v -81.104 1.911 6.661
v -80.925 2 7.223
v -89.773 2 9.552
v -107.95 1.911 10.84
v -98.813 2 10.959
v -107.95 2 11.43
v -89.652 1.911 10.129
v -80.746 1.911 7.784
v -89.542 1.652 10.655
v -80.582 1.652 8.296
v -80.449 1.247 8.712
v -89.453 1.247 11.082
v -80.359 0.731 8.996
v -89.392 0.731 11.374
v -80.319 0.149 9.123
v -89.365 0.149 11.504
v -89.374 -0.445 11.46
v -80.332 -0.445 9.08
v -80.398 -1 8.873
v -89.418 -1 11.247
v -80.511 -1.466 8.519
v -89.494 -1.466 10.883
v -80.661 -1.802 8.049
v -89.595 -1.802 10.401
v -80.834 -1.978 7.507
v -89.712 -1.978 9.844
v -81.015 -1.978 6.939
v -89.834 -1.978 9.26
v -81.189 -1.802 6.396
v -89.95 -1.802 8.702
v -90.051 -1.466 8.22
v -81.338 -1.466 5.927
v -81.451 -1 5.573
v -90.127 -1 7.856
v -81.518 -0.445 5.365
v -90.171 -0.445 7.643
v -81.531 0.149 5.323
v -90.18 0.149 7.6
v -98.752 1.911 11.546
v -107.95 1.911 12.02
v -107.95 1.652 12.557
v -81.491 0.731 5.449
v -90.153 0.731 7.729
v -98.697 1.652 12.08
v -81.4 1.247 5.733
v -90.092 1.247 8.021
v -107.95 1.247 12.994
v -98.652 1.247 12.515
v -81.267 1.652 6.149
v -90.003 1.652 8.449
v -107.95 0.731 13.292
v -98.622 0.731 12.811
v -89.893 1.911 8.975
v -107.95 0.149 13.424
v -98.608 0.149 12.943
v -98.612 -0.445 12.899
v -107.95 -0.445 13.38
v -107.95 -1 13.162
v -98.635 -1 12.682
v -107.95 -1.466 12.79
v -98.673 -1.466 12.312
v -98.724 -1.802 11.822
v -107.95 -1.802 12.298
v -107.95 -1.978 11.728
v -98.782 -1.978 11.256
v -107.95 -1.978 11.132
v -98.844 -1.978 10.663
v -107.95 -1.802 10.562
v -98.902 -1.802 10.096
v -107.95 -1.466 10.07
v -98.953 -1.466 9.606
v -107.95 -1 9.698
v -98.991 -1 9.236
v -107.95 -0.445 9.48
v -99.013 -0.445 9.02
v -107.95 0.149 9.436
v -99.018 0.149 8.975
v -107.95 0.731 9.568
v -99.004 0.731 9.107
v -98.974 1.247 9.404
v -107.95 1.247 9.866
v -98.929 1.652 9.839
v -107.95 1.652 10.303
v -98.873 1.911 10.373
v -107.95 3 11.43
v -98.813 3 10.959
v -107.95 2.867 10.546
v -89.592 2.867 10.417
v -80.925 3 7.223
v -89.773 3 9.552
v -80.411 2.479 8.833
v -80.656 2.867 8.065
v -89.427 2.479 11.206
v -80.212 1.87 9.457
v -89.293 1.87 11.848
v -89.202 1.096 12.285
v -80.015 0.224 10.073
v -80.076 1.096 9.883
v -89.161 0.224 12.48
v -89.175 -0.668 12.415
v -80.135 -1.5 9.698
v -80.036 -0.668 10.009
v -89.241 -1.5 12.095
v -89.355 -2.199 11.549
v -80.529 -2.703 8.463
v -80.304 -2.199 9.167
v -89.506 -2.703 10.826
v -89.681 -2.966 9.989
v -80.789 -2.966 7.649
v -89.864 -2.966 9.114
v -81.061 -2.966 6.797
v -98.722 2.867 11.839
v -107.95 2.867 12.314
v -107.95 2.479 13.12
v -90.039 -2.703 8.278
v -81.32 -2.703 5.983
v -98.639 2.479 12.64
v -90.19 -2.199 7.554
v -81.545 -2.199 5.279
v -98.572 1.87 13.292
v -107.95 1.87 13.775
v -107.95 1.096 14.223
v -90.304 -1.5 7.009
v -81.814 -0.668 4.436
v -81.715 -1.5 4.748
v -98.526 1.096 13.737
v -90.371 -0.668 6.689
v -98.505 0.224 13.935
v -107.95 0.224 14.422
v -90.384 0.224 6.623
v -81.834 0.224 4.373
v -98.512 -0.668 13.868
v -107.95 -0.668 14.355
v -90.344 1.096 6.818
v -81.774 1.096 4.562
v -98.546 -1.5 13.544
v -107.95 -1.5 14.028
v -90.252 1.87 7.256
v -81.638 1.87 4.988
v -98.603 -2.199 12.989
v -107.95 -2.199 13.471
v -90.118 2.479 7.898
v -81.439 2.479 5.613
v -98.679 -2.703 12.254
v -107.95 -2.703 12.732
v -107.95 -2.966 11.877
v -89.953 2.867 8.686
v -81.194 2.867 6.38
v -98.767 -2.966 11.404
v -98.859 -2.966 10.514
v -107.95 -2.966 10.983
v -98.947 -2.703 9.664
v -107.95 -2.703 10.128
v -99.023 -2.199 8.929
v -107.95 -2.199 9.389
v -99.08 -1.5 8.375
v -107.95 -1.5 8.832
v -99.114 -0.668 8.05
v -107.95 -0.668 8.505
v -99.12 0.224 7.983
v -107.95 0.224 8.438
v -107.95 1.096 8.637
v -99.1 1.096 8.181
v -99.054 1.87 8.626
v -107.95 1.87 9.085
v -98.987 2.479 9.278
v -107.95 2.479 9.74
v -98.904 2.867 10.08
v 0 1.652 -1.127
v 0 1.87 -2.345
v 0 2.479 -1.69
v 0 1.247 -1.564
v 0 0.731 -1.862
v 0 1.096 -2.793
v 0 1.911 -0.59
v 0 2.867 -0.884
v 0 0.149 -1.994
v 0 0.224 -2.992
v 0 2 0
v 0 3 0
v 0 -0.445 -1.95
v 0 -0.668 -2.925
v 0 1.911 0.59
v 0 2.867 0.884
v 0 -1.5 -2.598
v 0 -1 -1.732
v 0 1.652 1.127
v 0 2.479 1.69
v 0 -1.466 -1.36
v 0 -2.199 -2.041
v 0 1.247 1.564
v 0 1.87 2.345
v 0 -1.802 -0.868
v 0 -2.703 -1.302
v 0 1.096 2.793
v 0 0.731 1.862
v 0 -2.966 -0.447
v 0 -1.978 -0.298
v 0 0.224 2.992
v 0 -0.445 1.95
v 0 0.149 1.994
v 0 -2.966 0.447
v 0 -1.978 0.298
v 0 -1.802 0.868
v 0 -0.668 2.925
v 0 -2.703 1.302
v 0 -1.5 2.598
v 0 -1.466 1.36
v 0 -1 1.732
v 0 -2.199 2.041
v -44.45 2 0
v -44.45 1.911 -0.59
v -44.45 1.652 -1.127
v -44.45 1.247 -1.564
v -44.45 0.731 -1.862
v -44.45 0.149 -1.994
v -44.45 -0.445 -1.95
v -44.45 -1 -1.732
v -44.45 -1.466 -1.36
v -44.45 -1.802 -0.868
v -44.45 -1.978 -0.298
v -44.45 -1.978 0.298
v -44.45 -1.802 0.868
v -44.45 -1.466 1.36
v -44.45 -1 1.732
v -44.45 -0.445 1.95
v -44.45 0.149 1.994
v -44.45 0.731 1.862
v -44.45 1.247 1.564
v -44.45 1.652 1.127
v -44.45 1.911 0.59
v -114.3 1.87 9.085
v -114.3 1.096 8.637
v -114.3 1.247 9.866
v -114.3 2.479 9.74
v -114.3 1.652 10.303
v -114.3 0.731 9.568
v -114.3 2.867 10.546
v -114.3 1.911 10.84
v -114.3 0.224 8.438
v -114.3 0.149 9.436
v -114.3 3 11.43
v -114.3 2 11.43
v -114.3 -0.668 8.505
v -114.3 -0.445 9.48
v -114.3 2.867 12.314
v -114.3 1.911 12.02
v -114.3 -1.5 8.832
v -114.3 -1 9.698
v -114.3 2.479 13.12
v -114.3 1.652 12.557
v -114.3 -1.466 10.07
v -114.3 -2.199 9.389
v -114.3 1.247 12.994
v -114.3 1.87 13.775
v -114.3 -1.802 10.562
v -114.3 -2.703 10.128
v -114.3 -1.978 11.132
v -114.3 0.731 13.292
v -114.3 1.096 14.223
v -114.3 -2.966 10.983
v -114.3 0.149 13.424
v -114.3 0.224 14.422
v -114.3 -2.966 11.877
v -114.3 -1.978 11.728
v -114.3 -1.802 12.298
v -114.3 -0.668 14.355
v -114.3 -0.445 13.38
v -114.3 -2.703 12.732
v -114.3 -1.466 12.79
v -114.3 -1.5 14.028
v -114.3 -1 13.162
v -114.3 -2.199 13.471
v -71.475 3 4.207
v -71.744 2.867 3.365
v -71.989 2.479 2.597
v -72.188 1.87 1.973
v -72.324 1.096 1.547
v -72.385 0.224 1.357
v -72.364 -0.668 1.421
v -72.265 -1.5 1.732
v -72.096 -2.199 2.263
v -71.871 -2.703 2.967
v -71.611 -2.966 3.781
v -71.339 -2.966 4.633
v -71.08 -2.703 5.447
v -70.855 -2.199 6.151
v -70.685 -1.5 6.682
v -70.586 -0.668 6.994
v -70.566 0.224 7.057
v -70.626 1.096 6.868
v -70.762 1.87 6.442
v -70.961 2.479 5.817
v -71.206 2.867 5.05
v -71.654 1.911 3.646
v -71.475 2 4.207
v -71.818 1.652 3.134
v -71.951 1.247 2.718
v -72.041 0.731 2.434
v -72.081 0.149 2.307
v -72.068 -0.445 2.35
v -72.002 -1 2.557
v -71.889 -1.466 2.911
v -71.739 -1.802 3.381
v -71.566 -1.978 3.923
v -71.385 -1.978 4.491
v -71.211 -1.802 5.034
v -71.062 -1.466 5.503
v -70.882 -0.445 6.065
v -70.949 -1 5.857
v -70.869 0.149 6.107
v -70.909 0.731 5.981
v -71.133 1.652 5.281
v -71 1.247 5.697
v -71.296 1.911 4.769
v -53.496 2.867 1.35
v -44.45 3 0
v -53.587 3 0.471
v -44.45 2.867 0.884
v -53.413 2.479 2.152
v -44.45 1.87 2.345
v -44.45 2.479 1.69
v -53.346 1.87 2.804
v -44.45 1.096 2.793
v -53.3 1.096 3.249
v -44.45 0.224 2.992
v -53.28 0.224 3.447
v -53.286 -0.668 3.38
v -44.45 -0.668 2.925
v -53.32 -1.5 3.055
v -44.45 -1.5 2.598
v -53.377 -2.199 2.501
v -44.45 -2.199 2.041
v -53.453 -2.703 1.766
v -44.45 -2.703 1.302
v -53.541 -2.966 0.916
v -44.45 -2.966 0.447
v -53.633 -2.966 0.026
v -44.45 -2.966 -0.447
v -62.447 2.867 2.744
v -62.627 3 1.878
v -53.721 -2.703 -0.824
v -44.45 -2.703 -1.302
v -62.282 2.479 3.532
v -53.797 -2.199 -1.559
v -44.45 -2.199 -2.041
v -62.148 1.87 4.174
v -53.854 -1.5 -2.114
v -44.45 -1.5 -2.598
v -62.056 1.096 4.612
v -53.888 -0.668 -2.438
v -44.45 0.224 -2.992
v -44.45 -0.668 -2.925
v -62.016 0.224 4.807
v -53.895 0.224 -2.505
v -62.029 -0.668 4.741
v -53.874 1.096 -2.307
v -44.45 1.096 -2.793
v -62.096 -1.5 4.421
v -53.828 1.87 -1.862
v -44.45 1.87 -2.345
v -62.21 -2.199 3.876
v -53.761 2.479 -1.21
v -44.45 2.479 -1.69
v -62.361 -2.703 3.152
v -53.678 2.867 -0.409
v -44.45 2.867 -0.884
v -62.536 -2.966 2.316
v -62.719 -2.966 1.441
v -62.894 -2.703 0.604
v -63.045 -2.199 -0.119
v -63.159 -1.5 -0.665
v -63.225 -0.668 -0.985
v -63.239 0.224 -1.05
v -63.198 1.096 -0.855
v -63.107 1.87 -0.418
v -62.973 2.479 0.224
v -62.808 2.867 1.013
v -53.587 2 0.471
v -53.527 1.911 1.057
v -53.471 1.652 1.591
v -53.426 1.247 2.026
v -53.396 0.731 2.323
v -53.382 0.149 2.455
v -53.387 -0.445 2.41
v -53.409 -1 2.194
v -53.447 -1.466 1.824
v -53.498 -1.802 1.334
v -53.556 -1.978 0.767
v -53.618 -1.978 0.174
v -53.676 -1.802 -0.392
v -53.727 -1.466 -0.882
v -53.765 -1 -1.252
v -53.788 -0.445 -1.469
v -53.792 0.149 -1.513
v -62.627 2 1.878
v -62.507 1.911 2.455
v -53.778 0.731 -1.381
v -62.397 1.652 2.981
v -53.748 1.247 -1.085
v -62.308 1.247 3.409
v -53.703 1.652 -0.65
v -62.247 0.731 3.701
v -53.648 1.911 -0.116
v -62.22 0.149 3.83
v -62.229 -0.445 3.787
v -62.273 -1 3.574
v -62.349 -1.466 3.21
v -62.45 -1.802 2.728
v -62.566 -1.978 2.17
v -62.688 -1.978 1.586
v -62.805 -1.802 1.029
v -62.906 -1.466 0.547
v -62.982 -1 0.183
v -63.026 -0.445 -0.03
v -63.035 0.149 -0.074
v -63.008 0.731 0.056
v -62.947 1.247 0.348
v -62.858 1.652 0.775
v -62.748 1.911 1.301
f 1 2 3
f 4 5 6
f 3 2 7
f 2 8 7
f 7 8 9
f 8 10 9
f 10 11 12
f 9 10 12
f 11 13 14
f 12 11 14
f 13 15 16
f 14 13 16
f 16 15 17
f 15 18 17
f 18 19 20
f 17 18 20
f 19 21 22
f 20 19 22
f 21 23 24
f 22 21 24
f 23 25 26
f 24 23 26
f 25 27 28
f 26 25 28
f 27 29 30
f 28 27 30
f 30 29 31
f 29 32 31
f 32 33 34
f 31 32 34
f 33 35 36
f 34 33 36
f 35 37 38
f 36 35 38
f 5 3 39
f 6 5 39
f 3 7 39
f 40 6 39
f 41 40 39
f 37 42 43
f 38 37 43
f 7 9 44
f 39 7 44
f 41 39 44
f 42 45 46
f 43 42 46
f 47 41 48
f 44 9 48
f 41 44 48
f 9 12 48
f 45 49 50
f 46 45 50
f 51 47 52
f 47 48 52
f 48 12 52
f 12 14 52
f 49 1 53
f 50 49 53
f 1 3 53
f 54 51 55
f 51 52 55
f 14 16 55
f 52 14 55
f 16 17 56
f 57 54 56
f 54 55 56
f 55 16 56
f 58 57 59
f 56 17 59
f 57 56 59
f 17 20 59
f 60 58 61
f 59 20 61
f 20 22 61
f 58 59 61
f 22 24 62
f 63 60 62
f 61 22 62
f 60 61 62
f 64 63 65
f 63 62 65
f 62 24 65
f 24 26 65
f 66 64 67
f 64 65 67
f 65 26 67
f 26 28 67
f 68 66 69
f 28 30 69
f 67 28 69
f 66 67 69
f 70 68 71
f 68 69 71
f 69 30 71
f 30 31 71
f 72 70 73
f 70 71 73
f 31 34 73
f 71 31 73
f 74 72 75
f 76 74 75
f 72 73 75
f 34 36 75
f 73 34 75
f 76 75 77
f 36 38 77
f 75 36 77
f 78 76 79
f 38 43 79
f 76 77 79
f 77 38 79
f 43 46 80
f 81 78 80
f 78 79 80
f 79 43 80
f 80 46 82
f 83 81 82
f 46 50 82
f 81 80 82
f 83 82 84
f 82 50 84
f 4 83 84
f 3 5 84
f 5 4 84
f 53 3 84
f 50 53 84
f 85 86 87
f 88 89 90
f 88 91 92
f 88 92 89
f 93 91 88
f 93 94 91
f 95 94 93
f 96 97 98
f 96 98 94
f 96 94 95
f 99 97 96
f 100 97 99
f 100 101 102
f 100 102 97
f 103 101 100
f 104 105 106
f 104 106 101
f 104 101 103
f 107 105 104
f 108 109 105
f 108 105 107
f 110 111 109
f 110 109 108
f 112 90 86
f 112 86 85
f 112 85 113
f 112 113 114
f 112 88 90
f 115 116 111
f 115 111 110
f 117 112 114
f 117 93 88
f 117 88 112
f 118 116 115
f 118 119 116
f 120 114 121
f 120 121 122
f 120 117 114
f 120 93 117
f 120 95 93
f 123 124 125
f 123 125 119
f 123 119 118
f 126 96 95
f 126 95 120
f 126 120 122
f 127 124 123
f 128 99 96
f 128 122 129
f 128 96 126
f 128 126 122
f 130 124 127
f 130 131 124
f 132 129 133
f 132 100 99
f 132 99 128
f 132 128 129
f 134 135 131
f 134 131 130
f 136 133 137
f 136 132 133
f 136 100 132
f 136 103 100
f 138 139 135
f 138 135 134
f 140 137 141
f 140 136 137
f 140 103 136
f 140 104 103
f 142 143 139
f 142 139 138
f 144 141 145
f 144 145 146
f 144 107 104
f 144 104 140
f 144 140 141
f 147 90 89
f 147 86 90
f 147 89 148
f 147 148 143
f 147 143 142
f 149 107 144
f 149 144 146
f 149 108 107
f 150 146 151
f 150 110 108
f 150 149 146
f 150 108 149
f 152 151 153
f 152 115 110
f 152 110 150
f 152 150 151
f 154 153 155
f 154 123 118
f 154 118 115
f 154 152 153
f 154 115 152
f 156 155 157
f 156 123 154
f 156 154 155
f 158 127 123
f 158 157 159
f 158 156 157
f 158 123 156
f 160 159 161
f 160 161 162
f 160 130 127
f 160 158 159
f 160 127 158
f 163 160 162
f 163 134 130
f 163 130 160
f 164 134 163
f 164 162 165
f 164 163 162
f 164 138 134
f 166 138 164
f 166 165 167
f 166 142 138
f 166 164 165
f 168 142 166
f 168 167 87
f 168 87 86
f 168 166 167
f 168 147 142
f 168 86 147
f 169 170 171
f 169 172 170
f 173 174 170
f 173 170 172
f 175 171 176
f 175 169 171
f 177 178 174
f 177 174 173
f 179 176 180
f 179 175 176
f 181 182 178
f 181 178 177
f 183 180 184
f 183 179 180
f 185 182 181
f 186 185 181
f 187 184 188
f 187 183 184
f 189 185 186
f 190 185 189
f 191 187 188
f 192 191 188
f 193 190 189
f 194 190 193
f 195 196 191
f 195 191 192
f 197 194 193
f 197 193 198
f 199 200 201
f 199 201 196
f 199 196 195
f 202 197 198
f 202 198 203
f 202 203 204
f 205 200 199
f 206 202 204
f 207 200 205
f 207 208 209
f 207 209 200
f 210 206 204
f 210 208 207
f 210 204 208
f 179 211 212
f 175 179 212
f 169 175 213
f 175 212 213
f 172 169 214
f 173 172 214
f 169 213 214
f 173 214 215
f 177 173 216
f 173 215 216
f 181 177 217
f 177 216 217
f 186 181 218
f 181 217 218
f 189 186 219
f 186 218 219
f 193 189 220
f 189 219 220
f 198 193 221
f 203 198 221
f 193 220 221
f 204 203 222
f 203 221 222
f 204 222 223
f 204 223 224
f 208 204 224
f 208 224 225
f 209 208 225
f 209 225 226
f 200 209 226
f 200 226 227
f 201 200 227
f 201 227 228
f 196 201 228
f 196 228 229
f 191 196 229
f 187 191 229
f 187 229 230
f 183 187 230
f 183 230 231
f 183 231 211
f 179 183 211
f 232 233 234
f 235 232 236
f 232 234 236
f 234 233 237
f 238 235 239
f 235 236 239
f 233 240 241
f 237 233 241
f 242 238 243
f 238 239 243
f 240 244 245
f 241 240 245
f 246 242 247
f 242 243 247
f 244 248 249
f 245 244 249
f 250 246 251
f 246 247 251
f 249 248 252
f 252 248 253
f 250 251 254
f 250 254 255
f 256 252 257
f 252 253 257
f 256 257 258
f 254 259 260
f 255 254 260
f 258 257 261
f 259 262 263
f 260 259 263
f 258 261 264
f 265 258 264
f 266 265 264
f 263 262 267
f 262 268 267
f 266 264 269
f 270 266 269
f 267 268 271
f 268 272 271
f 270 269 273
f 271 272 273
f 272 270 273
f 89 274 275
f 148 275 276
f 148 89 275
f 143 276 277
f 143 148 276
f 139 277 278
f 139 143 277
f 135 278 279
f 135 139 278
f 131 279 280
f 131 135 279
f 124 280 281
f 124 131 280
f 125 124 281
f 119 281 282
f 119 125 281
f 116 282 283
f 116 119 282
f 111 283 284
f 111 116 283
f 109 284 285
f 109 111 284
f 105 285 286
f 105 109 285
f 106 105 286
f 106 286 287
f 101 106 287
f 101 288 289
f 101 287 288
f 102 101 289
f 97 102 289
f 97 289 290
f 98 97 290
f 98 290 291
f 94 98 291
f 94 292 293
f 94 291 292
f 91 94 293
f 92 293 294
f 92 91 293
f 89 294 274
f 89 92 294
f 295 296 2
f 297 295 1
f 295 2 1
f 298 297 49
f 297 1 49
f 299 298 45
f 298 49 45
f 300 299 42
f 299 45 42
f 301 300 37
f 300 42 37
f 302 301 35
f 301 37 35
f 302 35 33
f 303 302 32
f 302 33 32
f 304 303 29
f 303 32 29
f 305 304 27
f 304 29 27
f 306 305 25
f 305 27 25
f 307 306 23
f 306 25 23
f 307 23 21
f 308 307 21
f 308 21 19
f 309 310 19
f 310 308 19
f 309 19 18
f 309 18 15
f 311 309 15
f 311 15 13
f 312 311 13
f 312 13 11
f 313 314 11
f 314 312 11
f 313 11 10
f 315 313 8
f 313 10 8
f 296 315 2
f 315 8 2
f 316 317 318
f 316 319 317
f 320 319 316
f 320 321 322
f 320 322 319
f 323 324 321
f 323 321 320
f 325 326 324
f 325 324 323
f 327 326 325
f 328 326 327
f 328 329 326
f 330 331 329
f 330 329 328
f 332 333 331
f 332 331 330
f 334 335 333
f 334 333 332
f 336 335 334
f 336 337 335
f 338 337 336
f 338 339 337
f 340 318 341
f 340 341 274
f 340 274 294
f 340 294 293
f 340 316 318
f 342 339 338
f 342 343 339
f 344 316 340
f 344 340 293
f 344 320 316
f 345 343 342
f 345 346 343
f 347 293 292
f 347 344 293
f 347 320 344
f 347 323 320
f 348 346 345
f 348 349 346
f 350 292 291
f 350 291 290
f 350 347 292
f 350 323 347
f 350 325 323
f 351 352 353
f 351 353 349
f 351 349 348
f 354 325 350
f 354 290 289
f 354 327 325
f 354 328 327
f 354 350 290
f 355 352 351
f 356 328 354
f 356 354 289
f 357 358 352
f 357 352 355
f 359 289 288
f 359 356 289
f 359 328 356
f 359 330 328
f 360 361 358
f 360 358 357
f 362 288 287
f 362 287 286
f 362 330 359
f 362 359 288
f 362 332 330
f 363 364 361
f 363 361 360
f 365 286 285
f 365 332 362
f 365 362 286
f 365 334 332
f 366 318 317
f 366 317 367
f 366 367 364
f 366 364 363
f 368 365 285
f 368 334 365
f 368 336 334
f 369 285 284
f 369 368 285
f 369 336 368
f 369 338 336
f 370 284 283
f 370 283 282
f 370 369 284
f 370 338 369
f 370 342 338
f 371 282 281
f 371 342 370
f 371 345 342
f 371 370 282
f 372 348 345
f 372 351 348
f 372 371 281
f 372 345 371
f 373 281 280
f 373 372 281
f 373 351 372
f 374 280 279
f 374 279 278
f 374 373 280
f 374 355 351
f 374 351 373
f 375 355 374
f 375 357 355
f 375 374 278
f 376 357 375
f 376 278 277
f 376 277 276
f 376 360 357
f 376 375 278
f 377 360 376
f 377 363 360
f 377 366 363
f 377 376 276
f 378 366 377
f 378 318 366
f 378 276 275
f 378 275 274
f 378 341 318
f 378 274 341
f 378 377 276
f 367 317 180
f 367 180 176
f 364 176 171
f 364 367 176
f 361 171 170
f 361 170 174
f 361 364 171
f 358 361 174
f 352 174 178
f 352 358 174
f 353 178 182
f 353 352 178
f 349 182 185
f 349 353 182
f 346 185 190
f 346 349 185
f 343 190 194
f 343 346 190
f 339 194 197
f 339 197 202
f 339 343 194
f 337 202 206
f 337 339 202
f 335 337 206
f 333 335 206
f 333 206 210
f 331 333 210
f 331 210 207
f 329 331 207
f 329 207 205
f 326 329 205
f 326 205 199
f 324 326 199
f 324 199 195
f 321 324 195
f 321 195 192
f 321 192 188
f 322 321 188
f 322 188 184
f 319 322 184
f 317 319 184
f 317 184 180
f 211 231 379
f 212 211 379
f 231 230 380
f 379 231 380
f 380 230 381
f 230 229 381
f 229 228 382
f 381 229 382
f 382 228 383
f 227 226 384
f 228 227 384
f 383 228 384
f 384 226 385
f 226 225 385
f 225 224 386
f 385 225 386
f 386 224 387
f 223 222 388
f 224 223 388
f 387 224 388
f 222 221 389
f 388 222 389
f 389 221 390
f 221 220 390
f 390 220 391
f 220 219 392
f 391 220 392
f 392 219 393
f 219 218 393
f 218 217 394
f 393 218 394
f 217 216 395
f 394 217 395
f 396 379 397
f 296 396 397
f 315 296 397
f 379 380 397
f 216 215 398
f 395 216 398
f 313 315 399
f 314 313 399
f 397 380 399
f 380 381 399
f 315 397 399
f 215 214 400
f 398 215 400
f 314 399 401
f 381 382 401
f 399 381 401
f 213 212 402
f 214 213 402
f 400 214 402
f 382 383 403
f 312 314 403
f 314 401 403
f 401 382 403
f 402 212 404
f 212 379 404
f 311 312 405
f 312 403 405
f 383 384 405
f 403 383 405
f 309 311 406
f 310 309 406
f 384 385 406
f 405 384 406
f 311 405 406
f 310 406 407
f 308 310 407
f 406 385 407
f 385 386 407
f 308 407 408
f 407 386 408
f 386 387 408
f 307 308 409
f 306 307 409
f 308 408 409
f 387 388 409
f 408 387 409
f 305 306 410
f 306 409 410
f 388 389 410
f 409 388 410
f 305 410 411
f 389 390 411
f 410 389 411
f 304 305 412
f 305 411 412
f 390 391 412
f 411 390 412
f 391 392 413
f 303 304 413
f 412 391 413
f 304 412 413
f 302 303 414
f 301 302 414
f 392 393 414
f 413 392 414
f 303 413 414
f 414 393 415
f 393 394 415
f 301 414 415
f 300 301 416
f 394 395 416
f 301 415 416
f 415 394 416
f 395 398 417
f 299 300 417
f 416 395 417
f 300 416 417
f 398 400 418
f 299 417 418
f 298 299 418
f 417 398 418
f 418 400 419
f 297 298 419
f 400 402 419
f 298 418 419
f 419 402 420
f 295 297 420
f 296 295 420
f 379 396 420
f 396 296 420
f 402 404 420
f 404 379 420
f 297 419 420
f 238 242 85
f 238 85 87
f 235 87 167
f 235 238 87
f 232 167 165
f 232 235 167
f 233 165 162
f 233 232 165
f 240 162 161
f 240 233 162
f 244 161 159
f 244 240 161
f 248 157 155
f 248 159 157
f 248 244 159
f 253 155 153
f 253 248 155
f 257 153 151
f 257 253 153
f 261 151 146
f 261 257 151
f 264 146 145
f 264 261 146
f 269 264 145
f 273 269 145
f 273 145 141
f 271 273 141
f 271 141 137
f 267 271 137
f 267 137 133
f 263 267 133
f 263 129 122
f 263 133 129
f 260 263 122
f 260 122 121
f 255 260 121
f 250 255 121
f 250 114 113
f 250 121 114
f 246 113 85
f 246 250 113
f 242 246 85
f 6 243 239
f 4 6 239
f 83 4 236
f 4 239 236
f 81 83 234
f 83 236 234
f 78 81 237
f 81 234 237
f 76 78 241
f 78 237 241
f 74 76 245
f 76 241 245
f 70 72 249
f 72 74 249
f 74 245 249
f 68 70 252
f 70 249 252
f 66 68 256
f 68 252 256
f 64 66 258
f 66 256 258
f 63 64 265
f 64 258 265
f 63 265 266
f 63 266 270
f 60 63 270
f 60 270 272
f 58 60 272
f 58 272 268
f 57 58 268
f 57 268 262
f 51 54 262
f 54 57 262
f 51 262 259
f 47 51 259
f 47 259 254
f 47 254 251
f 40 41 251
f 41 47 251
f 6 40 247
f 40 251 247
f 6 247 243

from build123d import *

# Parameters (mm, degrees)
F0_R   = 3
F0_R_2 = 2


with BuildPart() as f2:
    # F2: sweep along a path in F1
    with BuildLine(Plane.XZ) as f2_path:
        Line((0, 0), (-44.45, 0))
        ThreePointArc((-44.45, 0), (-58.1253747721, 1.0581300014), (-71.4752079395, 4.2073312746))
        Line((-71.4752079395, 4.2073312746), (-80.9247920605, 7.2226687254))
        ThreePointArc((-80.9247920605, 7.2226687254), (-94.2746252279, 10.3718699986), (-107.95, 11.43))
        Line((-107.95, 11.43), (-114.3, 11.43))
    # F0 (on Right) → F2 (sweep)
    with BuildSketch(Plane.YZ):
        Circle(F0_R)
        Circle(F0_R_2, mode=Mode.SUBTRACT)
    sweep(path=f2_path.line)


solid = f2.part
